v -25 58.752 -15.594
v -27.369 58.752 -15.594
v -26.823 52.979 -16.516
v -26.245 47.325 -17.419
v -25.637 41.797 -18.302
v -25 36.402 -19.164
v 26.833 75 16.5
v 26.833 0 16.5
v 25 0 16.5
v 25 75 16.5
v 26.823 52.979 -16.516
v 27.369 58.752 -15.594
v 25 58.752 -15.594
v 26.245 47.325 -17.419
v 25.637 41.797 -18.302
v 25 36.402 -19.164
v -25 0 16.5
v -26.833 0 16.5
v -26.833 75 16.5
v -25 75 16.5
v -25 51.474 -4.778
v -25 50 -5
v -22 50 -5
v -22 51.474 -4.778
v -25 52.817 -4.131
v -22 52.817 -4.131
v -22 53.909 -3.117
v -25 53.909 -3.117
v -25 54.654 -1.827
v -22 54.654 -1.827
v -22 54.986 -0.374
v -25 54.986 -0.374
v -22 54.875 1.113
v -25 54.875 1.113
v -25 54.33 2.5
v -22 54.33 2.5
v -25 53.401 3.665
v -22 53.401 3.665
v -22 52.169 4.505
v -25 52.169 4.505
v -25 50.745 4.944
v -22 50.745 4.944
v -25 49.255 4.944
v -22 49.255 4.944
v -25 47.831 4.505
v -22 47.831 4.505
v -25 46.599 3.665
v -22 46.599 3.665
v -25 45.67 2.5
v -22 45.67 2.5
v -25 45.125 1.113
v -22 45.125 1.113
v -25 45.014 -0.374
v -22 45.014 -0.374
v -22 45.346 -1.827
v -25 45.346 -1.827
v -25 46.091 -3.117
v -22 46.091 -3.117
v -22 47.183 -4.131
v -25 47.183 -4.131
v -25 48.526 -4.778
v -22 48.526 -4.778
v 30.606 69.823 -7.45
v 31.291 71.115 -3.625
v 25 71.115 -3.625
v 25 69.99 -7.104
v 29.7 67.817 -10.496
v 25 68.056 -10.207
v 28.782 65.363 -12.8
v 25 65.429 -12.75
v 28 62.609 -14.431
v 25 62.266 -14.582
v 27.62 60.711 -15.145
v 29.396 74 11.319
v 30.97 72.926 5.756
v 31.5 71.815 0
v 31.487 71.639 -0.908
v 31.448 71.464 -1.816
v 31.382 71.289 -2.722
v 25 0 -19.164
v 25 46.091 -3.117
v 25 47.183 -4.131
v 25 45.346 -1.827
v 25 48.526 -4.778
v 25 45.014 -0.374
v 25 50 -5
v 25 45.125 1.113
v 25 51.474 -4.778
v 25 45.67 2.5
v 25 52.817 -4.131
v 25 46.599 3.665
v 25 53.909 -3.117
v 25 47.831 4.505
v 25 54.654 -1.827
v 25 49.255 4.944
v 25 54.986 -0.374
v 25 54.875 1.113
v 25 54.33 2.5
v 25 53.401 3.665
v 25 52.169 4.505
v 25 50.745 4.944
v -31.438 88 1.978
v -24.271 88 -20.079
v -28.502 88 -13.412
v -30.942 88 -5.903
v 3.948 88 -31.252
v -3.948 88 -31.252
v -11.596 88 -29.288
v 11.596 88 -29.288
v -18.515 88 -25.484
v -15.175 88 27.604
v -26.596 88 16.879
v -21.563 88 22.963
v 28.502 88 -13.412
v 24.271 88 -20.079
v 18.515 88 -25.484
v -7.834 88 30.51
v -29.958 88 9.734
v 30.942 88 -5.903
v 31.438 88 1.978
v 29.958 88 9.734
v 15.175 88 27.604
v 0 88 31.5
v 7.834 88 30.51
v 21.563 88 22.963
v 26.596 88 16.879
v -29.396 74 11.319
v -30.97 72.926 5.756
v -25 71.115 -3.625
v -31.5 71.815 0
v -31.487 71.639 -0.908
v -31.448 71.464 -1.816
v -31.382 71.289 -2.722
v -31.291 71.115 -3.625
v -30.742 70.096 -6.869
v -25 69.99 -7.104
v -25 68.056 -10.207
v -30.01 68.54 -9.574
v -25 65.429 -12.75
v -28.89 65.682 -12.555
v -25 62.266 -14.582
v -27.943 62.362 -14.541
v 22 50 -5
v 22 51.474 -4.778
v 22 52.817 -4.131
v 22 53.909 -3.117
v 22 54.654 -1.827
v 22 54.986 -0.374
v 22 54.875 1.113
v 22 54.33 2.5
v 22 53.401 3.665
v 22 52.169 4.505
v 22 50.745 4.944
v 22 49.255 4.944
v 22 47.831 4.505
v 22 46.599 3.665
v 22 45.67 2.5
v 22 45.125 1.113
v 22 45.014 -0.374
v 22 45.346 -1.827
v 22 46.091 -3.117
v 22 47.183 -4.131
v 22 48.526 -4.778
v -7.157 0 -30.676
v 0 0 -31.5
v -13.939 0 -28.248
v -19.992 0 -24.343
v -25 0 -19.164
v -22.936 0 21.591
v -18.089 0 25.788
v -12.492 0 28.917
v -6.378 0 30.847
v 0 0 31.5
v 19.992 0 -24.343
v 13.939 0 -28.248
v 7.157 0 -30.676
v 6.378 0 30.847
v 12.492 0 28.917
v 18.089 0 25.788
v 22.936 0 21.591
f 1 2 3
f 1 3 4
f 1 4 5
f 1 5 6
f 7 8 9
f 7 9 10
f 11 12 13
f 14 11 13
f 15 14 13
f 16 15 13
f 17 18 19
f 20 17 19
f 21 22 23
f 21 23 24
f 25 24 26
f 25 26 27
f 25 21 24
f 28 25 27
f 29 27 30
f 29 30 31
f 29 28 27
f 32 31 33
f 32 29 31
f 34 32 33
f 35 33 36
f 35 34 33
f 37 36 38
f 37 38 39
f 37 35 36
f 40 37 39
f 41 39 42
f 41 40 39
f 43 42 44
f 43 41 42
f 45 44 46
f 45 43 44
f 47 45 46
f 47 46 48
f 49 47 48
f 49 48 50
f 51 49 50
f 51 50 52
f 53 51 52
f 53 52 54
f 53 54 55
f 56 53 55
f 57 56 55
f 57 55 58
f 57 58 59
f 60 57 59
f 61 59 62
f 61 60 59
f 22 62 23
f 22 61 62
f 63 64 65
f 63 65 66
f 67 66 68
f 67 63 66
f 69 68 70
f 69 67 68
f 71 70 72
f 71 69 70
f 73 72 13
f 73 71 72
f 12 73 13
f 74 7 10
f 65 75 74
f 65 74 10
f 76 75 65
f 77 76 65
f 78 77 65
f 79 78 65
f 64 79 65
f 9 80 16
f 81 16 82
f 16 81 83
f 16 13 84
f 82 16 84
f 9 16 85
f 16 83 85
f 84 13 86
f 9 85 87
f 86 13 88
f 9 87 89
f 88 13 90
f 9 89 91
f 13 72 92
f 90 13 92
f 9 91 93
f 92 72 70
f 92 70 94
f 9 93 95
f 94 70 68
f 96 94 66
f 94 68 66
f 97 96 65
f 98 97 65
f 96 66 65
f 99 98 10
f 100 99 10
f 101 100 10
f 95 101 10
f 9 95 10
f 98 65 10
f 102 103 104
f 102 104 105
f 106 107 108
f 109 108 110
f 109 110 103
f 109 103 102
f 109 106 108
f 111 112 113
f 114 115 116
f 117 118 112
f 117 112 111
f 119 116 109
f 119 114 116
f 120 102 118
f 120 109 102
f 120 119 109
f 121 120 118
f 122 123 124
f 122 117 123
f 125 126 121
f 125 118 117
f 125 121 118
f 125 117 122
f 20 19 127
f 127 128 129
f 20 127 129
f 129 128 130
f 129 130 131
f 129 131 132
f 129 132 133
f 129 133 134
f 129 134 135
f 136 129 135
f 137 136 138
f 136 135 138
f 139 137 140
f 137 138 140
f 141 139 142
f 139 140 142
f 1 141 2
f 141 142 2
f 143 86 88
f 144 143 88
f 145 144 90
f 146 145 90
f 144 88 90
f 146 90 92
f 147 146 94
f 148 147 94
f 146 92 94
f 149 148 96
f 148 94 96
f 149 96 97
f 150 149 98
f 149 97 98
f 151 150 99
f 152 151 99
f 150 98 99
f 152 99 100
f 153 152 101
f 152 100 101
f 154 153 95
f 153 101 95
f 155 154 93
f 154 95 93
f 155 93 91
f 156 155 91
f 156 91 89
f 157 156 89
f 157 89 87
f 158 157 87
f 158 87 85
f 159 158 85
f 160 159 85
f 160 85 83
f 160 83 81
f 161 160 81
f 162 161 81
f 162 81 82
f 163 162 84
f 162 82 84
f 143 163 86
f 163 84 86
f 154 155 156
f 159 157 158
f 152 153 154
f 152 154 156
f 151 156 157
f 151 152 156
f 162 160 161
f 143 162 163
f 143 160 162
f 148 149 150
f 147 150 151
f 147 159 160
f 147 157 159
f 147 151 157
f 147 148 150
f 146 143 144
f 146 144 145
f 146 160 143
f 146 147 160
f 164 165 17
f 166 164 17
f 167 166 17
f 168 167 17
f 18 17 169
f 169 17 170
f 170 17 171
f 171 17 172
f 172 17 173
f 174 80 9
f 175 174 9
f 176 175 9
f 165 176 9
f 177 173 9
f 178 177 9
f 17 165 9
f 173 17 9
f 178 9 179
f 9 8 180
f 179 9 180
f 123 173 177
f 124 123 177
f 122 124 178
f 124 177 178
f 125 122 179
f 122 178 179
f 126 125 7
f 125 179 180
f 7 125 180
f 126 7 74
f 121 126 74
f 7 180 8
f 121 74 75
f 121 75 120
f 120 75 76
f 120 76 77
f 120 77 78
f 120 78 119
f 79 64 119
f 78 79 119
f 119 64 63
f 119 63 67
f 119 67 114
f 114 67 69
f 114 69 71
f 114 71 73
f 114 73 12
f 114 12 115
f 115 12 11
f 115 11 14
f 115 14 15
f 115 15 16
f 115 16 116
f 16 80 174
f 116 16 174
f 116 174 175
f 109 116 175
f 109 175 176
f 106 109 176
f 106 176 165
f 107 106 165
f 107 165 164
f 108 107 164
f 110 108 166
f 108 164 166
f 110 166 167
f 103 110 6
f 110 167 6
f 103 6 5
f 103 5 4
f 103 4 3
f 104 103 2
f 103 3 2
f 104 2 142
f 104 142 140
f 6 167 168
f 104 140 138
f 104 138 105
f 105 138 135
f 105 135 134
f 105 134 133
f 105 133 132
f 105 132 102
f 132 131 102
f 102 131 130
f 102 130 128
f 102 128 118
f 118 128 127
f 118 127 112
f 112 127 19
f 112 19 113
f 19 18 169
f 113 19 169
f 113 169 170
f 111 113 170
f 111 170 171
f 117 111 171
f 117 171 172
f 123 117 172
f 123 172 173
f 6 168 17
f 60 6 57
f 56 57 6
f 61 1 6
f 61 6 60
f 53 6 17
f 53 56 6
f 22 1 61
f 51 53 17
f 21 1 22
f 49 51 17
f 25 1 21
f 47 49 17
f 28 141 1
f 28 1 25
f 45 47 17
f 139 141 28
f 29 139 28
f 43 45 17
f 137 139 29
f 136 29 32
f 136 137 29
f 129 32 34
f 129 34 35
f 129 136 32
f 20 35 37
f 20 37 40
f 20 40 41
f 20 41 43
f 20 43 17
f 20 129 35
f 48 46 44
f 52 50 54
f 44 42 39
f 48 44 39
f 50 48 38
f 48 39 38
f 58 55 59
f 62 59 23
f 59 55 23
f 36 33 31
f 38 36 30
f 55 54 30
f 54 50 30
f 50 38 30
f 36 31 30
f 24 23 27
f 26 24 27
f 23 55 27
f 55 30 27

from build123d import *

# Parameters (mm, degrees)
SKETCH_1_R          = 31.5
EXTRUDE_1_DEPTH     = 88
CUT_EXTRUDE_1_DEPTH = 6.5
SKETCH_3_R          = 5
CUT_EXTRUDE_2_DEPTH = 3


with BuildPart() as part:
    # 草图1 → 凸台-拉伸1 (new body)
    with BuildSketch(Plane(origin=(0, 0, 0), x_dir=(1, 0, 0), z_dir=(0, 1, 0))):
        with Locations(Location((0, 0, 0), (0, 0, 270))):
            Circle(SKETCH_1_R)
    extrude(amount=EXTRUDE_1_DEPTH)

    # 草图2 → 切除-拉伸1 (cut)
    with BuildSketch(Plane(origin=(31.5, 0, 0), x_dir=(0, 0, -1), z_dir=(1, 0, 0))):
        with BuildLine():
            Line((-16.5, 75), (3.625312861, 71.114880191))
            ThreePointArc((3.625312861, 71.114880191), (11.558802441, 66.820544019), (15.59440661, 58.752367083))
            Line((15.59440661, 58.752367083), (24.977312136, 0))
            Line((24.977312136, 0), (-16.5, 0))
            Line((-16.5, 0), (-16.5, 75))
        make_face()
    cut_extrude_1 = extrude(amount=-CUT_EXTRUDE_1_DEPTH, mode=Mode.SUBTRACT)

    # 镜向1: 切除-拉伸1 across plane
    add(cut_extrude_1.mirror(Plane(origin=(0, 0, 0), x_dir=(0, 0, 1), z_dir=(1, 0, 0))), mode=Mode.SUBTRACT)

    # 草图3 → 切除-拉伸2 (cut)
    with BuildSketch(Plane(origin=(25, 0, 0), x_dir=(0, 0, -1), z_dir=(1, 0, 0))):
        with Locations((0, 50)):
            Circle(SKETCH_3_R)
    cut_extrude_2 = extrude(amount=-CUT_EXTRUDE_2_DEPTH, mode=Mode.SUBTRACT)

    # 镜向2: 切除-拉伸2 across plane
    add(cut_extrude_2.mirror(Plane(origin=(0, 0, 0), x_dir=(0, 0, 1), z_dir=(1, 0, 0))), mode=Mode.SUBTRACT)


solid = part.part
